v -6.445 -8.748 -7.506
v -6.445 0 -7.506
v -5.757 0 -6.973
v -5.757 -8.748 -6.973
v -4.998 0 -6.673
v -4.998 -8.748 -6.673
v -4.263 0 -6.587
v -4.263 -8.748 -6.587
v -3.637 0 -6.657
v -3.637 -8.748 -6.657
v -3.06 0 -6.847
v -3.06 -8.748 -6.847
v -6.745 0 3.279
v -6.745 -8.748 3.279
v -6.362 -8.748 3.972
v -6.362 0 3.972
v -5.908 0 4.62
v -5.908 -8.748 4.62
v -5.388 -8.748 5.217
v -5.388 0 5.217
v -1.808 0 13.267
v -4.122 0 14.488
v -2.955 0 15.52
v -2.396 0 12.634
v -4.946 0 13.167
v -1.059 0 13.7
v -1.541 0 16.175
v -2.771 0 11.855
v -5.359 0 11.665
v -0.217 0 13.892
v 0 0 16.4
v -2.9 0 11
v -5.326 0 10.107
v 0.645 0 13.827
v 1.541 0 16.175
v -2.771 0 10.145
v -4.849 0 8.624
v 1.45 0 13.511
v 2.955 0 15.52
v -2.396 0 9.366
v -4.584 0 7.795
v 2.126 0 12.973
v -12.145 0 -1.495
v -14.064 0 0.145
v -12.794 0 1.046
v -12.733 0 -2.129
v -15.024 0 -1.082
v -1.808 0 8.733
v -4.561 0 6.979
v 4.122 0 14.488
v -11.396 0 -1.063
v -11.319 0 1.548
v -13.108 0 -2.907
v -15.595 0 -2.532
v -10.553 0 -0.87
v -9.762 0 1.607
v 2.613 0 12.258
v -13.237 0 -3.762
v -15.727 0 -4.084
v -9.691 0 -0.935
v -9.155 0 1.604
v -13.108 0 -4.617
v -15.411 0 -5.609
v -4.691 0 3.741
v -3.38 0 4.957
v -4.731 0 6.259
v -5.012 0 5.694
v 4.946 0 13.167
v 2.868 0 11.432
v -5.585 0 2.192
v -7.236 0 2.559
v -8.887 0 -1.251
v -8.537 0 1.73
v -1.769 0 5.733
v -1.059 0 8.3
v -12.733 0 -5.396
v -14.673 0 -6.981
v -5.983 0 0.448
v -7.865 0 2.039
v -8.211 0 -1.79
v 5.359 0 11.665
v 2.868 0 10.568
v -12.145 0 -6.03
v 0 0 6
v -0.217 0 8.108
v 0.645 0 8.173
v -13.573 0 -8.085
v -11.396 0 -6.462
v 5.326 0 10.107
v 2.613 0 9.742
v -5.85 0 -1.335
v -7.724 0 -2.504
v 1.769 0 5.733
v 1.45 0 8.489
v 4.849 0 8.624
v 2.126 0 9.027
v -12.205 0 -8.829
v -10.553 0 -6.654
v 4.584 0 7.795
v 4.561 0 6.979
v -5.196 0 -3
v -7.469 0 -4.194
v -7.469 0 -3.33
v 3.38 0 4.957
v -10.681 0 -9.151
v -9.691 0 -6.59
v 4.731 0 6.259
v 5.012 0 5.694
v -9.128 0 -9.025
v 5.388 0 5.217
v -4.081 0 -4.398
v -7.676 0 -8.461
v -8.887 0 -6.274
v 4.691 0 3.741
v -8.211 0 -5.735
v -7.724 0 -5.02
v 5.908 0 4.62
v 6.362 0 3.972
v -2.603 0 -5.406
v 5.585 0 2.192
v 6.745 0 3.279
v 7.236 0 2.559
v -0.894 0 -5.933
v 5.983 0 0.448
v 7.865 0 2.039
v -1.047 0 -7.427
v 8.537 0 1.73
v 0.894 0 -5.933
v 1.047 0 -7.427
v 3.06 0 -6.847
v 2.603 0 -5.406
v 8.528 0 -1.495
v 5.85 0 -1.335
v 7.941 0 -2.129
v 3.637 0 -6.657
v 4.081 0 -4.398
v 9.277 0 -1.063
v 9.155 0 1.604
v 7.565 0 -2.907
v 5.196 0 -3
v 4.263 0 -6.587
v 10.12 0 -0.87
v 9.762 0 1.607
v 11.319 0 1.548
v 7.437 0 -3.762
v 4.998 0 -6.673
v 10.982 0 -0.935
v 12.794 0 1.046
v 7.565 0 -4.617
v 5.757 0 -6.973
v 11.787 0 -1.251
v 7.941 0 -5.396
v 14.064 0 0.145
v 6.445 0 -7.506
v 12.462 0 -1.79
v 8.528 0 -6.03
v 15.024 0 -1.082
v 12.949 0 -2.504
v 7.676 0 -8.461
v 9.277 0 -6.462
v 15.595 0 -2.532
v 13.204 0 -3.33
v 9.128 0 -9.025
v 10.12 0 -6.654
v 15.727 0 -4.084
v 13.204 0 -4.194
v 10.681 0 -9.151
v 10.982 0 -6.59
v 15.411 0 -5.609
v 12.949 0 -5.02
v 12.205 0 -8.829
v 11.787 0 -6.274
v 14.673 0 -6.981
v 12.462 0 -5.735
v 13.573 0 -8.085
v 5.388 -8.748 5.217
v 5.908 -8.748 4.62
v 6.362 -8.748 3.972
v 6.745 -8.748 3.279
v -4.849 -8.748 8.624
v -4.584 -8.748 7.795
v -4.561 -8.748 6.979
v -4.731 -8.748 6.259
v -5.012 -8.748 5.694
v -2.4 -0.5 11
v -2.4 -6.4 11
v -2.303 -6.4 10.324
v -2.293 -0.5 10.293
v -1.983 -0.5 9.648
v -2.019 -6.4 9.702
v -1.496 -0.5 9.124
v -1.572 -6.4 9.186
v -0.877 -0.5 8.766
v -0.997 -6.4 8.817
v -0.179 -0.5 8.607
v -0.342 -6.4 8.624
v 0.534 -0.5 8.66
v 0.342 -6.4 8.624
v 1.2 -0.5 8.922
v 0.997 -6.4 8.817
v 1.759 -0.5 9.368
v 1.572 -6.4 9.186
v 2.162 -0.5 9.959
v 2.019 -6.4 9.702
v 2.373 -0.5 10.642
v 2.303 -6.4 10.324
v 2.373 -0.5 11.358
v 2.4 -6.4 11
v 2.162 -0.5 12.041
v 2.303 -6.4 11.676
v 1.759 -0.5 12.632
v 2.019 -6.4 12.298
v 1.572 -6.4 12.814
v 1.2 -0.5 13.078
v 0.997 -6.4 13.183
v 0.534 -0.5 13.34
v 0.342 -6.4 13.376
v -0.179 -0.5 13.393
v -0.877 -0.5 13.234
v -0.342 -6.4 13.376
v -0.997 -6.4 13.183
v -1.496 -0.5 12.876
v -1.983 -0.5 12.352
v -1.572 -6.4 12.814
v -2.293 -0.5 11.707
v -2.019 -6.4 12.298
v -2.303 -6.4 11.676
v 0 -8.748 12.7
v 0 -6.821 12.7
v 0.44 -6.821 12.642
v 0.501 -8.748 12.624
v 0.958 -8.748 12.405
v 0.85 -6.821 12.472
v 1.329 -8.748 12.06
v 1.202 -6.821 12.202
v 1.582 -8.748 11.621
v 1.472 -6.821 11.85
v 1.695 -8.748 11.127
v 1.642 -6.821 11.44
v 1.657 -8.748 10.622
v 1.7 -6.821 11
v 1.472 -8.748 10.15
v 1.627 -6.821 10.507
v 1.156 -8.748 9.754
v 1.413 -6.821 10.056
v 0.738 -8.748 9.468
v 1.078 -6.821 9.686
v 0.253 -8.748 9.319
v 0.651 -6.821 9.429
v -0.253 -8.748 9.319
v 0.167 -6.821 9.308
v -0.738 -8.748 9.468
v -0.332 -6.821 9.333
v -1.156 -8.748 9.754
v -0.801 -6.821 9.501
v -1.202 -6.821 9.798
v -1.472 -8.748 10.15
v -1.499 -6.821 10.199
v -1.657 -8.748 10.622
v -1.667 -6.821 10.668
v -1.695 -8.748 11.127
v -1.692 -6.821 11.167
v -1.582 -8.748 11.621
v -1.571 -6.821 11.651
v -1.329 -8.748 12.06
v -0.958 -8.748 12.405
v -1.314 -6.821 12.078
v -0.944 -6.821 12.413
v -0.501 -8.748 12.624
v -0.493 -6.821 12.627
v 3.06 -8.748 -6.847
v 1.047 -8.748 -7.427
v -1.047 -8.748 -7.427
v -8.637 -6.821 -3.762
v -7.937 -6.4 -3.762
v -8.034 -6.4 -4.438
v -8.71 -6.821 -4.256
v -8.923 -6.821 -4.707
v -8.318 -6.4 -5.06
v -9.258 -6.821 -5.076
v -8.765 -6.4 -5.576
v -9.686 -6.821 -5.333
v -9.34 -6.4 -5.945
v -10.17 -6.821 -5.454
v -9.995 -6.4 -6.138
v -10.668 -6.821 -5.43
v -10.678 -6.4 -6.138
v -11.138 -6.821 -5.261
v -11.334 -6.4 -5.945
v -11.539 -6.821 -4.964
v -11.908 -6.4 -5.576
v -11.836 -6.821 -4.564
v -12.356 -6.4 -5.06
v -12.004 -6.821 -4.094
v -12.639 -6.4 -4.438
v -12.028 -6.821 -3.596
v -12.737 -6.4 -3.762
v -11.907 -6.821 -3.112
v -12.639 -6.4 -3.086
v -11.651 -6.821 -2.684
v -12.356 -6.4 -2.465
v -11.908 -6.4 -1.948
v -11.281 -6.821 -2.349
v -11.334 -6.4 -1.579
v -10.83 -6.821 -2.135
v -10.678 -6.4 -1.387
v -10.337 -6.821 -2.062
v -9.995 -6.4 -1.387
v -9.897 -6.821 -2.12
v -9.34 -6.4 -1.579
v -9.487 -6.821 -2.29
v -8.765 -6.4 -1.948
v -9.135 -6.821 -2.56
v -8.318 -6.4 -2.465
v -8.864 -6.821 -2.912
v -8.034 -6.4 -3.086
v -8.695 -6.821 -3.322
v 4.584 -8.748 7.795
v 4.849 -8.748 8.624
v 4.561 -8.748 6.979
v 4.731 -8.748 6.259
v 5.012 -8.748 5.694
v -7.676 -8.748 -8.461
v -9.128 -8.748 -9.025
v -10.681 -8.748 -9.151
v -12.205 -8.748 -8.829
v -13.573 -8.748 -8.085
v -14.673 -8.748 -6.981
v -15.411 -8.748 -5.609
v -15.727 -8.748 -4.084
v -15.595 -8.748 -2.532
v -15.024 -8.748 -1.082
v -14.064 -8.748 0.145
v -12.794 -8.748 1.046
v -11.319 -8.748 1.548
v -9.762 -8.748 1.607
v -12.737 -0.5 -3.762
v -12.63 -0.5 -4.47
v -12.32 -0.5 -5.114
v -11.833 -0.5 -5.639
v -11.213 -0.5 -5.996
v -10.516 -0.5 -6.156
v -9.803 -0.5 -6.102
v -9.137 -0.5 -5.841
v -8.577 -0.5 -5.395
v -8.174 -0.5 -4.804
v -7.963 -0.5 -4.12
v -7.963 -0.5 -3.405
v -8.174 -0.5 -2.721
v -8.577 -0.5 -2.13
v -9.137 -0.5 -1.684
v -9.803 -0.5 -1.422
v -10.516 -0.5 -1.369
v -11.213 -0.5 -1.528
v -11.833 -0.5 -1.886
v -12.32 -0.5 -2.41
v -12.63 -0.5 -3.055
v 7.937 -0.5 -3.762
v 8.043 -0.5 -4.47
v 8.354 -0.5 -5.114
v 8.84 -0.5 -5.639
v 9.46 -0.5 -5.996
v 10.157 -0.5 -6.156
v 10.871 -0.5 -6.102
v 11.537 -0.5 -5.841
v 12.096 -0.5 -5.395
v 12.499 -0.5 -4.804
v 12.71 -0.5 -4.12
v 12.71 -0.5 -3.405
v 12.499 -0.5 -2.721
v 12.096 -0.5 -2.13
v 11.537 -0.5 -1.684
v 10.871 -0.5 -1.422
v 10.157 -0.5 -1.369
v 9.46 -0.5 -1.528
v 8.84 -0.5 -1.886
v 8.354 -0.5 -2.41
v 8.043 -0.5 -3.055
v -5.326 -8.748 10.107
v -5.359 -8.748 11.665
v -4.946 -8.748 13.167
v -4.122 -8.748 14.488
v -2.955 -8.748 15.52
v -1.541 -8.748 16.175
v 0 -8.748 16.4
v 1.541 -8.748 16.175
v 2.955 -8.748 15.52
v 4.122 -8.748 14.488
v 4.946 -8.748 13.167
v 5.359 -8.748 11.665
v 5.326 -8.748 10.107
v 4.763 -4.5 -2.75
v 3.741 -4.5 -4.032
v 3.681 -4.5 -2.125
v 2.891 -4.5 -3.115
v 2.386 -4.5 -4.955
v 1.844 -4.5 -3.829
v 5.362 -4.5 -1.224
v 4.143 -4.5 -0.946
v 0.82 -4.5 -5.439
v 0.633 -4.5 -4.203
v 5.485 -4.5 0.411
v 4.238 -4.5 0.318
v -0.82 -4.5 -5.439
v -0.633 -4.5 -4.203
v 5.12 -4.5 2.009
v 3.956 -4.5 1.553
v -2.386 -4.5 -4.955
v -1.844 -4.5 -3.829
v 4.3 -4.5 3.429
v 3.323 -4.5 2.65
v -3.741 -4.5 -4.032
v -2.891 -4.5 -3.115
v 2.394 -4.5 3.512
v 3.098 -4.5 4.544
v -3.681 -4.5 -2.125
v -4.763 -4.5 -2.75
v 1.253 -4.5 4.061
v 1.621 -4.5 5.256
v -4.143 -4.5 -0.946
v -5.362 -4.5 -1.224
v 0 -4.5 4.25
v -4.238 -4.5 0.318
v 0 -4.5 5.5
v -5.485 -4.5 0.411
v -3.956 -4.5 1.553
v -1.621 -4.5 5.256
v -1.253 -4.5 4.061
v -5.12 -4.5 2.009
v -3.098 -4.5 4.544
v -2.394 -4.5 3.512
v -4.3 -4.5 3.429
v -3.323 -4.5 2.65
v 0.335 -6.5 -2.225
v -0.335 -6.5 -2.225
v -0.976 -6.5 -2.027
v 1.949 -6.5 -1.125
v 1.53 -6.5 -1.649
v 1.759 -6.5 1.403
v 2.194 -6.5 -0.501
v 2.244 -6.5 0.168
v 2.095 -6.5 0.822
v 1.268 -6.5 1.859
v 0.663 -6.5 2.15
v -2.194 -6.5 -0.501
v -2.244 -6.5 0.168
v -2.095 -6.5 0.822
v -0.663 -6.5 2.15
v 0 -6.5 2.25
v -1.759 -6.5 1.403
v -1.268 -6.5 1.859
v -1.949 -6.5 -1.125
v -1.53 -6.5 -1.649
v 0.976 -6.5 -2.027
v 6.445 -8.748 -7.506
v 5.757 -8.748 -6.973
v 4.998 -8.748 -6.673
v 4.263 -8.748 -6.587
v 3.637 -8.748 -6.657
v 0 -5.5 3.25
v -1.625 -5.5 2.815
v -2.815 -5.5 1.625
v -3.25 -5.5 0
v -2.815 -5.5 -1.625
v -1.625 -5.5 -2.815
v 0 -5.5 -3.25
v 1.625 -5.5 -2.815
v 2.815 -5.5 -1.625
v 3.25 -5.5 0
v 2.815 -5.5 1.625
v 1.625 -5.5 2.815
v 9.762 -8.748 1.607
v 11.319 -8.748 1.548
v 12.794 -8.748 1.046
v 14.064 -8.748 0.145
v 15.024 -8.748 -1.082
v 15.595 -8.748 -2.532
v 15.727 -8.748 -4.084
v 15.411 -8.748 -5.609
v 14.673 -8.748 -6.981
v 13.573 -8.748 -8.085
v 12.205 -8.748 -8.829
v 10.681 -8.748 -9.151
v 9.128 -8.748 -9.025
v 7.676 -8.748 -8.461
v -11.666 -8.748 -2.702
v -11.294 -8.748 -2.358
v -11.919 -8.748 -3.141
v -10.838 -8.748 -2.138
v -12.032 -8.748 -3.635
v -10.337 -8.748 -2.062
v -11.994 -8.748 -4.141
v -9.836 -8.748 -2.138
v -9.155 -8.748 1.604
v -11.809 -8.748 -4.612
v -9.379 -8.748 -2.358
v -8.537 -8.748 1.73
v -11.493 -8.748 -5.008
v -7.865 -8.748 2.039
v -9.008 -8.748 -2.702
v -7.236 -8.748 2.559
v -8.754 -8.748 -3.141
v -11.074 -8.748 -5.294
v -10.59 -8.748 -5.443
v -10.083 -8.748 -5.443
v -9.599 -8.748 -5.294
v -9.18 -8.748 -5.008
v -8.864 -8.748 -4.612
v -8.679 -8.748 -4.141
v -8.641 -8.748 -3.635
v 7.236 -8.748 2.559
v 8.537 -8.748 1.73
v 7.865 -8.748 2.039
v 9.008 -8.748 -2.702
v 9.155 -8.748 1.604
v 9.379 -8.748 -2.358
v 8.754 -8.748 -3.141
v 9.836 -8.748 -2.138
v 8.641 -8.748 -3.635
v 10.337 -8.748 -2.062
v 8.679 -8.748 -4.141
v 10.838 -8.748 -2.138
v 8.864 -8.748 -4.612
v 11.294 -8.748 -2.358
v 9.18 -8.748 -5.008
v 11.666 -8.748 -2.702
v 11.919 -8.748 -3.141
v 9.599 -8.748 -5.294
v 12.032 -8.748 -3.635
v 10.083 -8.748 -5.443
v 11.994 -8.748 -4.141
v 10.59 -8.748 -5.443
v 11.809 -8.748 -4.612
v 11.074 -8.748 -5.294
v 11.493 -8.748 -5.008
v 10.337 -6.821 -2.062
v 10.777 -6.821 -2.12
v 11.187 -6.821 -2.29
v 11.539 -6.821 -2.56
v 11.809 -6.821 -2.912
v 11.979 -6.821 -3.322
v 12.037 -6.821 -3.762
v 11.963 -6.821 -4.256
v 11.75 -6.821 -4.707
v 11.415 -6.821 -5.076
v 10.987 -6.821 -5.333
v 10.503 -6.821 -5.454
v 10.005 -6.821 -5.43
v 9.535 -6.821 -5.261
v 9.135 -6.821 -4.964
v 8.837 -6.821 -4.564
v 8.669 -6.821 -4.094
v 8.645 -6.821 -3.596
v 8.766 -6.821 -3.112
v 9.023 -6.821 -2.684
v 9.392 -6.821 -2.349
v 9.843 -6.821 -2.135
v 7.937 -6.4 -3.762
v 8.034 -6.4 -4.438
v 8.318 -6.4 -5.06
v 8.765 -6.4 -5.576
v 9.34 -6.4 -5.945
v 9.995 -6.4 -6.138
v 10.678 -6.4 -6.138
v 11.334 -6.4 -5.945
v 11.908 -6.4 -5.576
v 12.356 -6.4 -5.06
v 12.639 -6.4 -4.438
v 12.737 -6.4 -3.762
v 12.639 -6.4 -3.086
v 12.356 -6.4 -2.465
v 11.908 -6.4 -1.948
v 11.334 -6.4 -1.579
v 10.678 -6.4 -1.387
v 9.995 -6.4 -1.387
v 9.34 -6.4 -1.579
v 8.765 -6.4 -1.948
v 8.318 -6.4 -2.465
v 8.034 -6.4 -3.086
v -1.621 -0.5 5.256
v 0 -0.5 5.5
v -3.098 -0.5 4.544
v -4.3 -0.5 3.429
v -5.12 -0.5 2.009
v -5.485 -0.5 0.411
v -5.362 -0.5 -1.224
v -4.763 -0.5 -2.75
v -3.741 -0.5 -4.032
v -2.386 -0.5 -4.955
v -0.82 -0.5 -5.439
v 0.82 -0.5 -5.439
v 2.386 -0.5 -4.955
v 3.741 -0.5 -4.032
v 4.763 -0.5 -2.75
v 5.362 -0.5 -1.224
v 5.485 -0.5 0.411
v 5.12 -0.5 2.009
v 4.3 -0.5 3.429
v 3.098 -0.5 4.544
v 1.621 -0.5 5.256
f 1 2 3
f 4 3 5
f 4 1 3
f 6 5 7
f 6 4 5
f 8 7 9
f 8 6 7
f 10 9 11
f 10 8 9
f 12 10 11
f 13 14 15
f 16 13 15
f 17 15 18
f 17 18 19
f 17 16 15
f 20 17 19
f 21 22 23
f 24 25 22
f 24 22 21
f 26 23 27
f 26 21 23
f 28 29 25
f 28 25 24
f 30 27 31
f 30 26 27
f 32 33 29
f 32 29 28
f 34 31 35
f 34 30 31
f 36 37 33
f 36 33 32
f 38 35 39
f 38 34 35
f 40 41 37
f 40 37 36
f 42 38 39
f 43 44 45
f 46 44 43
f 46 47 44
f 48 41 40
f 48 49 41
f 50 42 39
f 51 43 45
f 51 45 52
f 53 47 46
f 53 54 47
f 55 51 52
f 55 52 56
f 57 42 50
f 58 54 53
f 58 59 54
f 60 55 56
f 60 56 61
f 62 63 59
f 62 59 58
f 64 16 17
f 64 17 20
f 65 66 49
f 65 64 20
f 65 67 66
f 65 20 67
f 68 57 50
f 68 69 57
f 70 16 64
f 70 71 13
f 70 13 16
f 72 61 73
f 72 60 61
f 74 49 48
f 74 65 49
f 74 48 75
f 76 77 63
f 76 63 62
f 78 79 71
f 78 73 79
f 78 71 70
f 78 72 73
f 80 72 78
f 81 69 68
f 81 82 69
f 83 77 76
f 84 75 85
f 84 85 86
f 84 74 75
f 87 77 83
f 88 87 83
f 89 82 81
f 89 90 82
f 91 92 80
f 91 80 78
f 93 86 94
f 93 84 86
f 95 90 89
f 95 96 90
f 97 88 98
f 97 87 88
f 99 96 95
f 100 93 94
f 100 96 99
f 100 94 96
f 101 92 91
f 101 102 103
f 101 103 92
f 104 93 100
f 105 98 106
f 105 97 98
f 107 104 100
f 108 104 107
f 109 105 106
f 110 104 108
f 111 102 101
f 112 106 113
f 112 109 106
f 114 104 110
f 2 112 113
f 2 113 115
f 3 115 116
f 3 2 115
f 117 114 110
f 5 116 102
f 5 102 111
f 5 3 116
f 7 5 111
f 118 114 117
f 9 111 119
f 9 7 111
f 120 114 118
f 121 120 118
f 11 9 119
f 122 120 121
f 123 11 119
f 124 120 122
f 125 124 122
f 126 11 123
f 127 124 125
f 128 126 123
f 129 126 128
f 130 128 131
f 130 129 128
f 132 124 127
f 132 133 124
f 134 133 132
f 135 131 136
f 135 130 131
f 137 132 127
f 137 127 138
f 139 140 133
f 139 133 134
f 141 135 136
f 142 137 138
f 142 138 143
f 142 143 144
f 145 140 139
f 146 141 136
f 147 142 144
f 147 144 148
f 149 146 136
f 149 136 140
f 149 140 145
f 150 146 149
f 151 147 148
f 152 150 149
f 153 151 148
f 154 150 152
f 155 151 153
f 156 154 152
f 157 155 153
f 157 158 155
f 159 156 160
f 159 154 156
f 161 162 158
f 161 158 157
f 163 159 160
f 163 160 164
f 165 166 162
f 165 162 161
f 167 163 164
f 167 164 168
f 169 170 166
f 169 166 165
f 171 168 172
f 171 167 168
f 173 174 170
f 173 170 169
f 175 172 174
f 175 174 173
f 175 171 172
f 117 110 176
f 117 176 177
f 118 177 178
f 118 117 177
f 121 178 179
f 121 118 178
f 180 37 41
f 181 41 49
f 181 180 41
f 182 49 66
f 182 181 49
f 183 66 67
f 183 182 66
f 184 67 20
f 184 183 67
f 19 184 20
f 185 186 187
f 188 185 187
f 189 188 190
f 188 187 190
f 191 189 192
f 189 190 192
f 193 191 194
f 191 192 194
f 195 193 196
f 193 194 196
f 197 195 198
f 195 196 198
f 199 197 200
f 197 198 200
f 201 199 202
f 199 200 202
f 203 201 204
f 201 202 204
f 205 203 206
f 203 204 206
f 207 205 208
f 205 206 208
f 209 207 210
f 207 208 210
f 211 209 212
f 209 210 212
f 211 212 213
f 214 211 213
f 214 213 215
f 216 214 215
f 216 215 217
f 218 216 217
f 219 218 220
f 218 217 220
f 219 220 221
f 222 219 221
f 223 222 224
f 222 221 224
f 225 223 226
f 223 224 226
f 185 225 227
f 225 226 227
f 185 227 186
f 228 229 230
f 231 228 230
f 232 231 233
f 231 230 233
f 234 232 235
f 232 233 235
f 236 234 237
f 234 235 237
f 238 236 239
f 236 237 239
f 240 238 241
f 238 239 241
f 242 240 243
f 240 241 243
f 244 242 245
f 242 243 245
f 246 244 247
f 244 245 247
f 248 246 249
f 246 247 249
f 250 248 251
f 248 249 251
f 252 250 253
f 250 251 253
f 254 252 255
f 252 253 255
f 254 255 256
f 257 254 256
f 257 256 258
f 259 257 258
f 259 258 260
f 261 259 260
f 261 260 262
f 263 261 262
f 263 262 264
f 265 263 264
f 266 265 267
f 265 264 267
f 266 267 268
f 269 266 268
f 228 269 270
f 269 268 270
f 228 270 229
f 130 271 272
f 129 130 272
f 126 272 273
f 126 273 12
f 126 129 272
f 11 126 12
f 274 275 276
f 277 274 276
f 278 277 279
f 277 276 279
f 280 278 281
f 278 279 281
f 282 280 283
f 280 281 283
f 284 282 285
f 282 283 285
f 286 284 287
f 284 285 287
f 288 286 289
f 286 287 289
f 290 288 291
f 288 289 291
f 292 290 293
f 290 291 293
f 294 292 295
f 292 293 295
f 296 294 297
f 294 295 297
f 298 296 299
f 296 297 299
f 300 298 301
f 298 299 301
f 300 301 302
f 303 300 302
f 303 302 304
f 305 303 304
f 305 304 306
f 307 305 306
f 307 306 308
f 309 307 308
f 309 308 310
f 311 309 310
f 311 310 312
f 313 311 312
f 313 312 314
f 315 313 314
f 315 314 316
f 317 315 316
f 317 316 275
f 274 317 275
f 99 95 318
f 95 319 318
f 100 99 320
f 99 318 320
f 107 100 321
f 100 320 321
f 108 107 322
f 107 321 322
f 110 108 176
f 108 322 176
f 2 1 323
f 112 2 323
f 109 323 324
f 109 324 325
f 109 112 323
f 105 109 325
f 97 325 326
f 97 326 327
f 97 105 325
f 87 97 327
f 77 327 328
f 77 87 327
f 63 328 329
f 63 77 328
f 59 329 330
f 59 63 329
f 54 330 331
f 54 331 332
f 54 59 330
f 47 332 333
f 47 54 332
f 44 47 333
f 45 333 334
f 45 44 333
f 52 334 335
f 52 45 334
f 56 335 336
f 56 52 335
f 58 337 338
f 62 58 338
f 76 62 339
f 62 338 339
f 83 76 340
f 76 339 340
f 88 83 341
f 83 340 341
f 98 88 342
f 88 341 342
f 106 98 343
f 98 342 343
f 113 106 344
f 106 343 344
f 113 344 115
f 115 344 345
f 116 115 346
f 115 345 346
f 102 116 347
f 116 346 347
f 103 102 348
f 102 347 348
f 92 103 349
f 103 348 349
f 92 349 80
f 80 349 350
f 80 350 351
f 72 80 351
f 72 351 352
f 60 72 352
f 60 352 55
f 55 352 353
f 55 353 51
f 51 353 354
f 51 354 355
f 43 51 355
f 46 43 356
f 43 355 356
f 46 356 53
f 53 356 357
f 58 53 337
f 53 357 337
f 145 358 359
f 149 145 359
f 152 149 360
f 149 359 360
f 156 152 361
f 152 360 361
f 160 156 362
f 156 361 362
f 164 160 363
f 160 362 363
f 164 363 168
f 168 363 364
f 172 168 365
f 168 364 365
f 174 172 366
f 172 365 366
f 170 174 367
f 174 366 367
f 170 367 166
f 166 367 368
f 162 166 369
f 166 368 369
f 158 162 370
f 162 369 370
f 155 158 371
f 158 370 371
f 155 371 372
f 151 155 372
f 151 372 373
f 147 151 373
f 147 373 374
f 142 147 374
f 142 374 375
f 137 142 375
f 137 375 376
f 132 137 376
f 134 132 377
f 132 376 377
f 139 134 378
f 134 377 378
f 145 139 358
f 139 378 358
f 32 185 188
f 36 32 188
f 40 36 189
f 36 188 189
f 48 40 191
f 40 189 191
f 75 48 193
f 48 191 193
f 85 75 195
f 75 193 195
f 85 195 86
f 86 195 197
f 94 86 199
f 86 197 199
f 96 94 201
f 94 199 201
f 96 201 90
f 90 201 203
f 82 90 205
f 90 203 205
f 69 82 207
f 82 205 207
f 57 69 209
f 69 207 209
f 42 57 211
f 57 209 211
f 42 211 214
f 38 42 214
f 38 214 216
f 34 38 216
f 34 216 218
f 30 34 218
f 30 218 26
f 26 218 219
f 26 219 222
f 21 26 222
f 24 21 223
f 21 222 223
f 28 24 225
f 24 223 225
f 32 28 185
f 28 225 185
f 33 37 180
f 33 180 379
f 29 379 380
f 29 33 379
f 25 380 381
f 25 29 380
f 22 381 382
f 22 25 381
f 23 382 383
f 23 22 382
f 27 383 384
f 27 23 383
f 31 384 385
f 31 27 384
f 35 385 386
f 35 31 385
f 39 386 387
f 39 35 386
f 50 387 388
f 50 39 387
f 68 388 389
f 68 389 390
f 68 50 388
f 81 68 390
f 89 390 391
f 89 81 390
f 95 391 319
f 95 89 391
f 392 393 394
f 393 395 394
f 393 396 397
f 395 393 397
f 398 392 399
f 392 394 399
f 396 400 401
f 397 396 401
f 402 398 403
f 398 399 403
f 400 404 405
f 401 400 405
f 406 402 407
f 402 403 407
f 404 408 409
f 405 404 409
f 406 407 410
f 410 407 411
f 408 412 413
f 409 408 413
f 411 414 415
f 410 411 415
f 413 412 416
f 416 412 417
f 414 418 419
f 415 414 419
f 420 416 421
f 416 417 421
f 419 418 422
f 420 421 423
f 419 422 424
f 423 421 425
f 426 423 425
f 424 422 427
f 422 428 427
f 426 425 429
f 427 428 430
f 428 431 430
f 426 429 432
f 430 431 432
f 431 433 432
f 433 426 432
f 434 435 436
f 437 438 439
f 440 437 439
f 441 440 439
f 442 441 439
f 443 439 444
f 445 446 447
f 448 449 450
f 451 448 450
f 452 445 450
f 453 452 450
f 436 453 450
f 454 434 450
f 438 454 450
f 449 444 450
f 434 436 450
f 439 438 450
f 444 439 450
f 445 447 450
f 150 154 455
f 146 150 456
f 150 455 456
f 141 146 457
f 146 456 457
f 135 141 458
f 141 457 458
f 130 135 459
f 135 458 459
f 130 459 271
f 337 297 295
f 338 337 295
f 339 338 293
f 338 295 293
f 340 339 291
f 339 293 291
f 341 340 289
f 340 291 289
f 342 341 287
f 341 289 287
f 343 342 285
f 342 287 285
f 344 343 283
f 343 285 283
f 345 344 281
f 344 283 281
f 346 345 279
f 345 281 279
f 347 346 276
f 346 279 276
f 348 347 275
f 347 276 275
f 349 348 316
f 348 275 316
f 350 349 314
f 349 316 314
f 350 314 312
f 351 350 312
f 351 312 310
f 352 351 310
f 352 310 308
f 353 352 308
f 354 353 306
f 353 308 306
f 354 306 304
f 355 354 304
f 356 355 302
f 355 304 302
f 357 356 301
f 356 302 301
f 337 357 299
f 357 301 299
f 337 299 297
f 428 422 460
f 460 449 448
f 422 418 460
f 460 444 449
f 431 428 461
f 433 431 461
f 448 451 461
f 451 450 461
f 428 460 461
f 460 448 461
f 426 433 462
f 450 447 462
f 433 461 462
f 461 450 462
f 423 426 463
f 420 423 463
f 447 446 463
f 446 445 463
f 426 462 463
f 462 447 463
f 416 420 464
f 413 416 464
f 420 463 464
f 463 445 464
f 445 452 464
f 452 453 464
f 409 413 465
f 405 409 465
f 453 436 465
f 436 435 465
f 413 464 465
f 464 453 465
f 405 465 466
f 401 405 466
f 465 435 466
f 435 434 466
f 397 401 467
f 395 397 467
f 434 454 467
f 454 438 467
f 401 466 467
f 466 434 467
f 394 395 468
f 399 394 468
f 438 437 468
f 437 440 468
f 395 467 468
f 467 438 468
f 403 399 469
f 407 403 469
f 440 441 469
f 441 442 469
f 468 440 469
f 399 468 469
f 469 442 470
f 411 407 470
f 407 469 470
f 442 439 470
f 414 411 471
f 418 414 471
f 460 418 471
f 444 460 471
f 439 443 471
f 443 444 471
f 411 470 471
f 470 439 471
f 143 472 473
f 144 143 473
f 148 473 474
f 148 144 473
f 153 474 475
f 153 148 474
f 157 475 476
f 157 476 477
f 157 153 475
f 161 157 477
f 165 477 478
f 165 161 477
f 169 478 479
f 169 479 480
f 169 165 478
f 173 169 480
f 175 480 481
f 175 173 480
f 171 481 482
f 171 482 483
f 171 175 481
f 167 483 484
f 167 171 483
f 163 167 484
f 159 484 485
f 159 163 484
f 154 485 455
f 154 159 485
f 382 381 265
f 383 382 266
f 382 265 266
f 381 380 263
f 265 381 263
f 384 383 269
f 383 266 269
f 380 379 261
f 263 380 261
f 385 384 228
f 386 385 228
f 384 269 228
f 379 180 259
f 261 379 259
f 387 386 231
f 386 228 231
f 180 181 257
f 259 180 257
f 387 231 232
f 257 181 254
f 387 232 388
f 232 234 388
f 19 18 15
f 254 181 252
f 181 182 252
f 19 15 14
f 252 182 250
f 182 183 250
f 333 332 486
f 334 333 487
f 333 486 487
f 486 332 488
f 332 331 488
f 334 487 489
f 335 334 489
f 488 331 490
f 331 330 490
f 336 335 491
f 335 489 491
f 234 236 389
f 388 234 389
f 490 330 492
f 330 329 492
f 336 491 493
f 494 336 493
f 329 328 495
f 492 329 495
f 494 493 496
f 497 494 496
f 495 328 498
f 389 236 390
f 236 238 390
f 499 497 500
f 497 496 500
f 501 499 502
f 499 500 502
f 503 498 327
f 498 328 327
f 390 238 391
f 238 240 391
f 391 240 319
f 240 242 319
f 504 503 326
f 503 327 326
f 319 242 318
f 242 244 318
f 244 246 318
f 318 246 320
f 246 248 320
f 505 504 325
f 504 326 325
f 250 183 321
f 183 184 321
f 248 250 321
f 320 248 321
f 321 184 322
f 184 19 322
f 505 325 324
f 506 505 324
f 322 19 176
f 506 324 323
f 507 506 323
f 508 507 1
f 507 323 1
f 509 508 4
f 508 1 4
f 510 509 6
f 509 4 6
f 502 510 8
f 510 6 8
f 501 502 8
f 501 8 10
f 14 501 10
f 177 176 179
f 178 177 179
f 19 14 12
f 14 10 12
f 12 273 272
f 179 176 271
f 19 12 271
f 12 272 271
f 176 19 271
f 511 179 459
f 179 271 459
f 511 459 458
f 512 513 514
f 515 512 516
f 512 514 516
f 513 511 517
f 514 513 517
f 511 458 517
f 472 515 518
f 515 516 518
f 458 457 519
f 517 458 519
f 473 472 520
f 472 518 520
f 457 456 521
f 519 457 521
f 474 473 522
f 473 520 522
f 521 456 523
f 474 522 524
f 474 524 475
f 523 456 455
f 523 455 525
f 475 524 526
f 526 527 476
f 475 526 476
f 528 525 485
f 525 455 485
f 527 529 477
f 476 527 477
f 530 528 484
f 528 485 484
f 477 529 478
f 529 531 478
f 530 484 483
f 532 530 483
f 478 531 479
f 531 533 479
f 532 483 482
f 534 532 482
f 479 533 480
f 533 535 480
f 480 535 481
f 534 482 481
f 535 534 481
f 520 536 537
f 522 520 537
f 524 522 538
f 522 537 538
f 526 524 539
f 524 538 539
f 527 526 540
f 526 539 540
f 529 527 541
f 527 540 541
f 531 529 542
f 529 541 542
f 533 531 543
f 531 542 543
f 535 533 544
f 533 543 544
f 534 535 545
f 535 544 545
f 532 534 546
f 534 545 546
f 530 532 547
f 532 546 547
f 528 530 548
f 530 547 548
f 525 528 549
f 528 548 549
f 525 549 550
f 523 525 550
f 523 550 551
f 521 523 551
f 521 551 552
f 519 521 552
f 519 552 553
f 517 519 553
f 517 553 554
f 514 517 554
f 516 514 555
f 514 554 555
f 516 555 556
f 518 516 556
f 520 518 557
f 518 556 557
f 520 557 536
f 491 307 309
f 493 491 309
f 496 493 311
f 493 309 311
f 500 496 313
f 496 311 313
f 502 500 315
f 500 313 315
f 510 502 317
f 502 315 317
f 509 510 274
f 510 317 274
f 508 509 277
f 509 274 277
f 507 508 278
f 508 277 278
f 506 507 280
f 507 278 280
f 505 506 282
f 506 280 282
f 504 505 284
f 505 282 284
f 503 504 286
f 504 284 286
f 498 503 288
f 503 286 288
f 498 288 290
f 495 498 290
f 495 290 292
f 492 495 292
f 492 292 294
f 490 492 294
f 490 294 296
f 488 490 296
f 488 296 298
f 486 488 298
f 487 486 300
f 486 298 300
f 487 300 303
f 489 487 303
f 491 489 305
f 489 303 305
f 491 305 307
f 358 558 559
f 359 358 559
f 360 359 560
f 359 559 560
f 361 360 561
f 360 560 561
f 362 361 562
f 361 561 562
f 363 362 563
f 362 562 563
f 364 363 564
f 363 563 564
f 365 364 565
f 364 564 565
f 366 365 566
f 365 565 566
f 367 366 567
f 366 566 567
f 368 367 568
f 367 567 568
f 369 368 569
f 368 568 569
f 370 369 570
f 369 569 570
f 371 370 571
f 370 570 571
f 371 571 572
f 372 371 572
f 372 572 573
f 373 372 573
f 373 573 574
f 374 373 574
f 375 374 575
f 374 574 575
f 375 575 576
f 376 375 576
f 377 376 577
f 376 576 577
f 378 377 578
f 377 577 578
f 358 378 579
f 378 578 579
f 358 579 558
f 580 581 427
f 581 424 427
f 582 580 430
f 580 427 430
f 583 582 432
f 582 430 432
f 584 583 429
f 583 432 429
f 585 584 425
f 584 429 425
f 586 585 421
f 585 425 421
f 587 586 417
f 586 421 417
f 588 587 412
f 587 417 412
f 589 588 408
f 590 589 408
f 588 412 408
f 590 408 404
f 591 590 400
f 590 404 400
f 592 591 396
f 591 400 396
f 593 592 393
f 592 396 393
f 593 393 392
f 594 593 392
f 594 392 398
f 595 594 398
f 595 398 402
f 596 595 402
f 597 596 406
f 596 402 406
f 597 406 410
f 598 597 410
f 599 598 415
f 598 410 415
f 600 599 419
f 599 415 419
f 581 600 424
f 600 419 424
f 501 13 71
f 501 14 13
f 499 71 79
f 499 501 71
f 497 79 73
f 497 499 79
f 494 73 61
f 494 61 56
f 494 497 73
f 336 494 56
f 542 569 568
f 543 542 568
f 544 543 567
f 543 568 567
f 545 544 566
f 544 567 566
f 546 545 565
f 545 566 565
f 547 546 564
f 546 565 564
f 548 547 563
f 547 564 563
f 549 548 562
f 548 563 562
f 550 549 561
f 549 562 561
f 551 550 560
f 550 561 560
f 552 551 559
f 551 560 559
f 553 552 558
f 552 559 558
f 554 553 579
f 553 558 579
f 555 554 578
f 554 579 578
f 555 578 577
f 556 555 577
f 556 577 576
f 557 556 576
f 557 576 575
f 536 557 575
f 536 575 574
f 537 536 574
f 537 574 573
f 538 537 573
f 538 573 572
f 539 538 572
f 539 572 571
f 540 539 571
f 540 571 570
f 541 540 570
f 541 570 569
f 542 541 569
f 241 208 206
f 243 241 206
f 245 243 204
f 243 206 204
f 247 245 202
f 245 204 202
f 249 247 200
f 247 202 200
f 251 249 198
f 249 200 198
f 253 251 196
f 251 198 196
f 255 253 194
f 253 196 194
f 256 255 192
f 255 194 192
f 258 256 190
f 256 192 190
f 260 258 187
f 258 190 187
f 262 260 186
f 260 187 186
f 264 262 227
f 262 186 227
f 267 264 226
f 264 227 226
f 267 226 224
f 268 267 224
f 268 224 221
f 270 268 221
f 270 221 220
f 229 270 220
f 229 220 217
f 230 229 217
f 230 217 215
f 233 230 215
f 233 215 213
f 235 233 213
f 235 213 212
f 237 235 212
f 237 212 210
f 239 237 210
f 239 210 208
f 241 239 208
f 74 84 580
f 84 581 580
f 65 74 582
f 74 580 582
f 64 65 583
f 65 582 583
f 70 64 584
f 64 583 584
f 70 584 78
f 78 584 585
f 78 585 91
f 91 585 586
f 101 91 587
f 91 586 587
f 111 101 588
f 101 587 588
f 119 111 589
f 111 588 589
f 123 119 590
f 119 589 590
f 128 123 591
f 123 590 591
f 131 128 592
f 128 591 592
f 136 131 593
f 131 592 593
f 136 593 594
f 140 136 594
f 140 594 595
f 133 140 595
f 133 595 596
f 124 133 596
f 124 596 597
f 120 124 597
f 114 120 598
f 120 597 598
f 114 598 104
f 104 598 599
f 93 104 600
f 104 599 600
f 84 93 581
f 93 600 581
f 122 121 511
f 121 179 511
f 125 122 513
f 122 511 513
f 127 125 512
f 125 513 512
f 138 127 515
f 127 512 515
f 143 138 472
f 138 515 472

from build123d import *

# Parameters (mm, degrees)
SKETCH1_R                      = 1.7
BOSS_EXTRUDE1_DEPTH            = 8.74825
F_4_8_4_8_DIAMETER_HOLE1_D     = 4.8
F_4_8_4_8_DIAMETER_HOLE1_DEPTH = 6.4
F_4_8_4_8_DIAMETER_HOLE1_TIP   = 1.442065486
CHANFREIN3_SIZE                = 0.5
FILLET1_R                      = 3
CHANFREIN2_SIZE                = 2


with BuildPart() as part:
    # Sketch1 → Boss-Extrude1 (new body)
    with BuildSketch(Plane(origin=(0, 0, 0), x_dir=(1, 0, 0), z_dir=(0, 1, 0))):
        with BuildLine():
            ThreePointArc((-3.307377147, -6.731363636), (0, -16.4), (3.307377147, -6.731363636))
            ThreePointArc((3.307377147, -6.731363636), (6.143640332, -4.301823273), (7.456602343, -0.805655944))
            ThreePointArc((7.456602343, -0.805655944), (15.410958981, 5.609130351), (5.194223131, 5.410179855))
            ThreePointArc((5.194223131, 5.410179855), (0, 7.5), (-5.194223131, 5.410179855))
            ThreePointArc((-5.194223131, 5.410179855), (-15.410958981, 5.609130351), (-7.456602343, -0.805655944))
            ThreePointArc((-7.456602343, -0.805655944), (-6.143640332, -4.301823273), (-3.307377147, -6.731363636))
        make_face()
        with Locations(Location((0, -11, 0), (0, 0, 270))):
            Circle(SKETCH1_R, mode=Mode.SUBTRACT)
        with Locations(Location((-10.336618829, 3.762221577, 0), (0, 0, 270))):
            Circle(SKETCH1_R, mode=Mode.SUBTRACT)
        with Locations(Location((10.336618829, 3.762221577, 0), (0, 0, 270))):
            Circle(SKETCH1_R, mode=Mode.SUBTRACT)
    extrude(amount=-BOSS_EXTRUDE1_DEPTH)

    # Ø4.8 (4.8) Diameter Hole1
    with Locations(Plane(origin=(0, 0, 0), x_dir=(1, 0, 0), z_dir=(0, 1, 0))):
        with Locations((-10.336618829, 3.762221577), (10.336618829, 3.762221577), (0, -11)):
            Hole(F_4_8_4_8_DIAMETER_HOLE1_D / 2, depth=F_4_8_4_8_DIAMETER_HOLE1_DEPTH)
            with Locations((0, 0, -(F_4_8_4_8_DIAMETER_HOLE1_DEPTH + F_4_8_4_8_DIAMETER_HOLE1_TIP / 2))):  # 118° drill point
                Cone(0, F_4_8_4_8_DIAMETER_HOLE1_D / 2, F_4_8_4_8_DIAMETER_HOLE1_TIP, mode=Mode.SUBTRACT)

    # Chanfrein3
    chanfrein3_edges = [part.edges().sort_by_distance(p)[0] for p in [
        (2.4, 0, 11),
        (12.736618829, 0, -3.762221577),
        (-7.936618829, 0, -3.762221577),
    ]]
    chamfer(chanfrein3_edges, length=CHANFREIN3_SIZE)

    # Sketch2 → Cut-Revolve1 (revolve, cut)
    with BuildSketch(Plane(origin=(0, 0, 0), x_dir=(0, 0, -1), z_dir=(1, 0, 0)), mode=Mode.PRIVATE) as cut_revolve1_sk:
        Polygon((0, 0), (6, 0), (5.5, -0.5), (5.5, -4.5), (4.25, -4.5), (4.25, -6.5), (0, -6.5), align=None)
    revolve(cut_revolve1_sk.sketch.rotate(Axis((0, 1.69902052, 0), (0, -1, 0)), 180), axis=Axis((0, 1.69902052, 0), (0, -1, 0)), mode=Mode.SUBTRACT)

    # Fillet1
    fillet1_edges = [part.edges().sort_by_distance(p)[0] for p in [
        (3.307377147, -4.374125, 6.731363636),
        (-3.307377147, -4.374125, 6.731363636),
        (-7.456602343, -4.374125, 0.805655944),
        (-5.194223131, -4.374125, -5.410179855),
        (5.194223131, -4.374125, -5.410179855),
        (7.456602343, -4.374125, 0.805655944),
    ]]
    fillet(fillet1_edges, radius=FILLET1_R)

    # Chanfrein2
    chanfrein2_edges = [part.edges().sort_by_distance(p)[0] for p in [
        (0, -6.5, -4.25),
    ]]
    chamfer(chanfrein2_edges, length=CHANFREIN2_SIZE - 0.0001)  # a hair under: the kernel refuses the full size


solid = part.part
